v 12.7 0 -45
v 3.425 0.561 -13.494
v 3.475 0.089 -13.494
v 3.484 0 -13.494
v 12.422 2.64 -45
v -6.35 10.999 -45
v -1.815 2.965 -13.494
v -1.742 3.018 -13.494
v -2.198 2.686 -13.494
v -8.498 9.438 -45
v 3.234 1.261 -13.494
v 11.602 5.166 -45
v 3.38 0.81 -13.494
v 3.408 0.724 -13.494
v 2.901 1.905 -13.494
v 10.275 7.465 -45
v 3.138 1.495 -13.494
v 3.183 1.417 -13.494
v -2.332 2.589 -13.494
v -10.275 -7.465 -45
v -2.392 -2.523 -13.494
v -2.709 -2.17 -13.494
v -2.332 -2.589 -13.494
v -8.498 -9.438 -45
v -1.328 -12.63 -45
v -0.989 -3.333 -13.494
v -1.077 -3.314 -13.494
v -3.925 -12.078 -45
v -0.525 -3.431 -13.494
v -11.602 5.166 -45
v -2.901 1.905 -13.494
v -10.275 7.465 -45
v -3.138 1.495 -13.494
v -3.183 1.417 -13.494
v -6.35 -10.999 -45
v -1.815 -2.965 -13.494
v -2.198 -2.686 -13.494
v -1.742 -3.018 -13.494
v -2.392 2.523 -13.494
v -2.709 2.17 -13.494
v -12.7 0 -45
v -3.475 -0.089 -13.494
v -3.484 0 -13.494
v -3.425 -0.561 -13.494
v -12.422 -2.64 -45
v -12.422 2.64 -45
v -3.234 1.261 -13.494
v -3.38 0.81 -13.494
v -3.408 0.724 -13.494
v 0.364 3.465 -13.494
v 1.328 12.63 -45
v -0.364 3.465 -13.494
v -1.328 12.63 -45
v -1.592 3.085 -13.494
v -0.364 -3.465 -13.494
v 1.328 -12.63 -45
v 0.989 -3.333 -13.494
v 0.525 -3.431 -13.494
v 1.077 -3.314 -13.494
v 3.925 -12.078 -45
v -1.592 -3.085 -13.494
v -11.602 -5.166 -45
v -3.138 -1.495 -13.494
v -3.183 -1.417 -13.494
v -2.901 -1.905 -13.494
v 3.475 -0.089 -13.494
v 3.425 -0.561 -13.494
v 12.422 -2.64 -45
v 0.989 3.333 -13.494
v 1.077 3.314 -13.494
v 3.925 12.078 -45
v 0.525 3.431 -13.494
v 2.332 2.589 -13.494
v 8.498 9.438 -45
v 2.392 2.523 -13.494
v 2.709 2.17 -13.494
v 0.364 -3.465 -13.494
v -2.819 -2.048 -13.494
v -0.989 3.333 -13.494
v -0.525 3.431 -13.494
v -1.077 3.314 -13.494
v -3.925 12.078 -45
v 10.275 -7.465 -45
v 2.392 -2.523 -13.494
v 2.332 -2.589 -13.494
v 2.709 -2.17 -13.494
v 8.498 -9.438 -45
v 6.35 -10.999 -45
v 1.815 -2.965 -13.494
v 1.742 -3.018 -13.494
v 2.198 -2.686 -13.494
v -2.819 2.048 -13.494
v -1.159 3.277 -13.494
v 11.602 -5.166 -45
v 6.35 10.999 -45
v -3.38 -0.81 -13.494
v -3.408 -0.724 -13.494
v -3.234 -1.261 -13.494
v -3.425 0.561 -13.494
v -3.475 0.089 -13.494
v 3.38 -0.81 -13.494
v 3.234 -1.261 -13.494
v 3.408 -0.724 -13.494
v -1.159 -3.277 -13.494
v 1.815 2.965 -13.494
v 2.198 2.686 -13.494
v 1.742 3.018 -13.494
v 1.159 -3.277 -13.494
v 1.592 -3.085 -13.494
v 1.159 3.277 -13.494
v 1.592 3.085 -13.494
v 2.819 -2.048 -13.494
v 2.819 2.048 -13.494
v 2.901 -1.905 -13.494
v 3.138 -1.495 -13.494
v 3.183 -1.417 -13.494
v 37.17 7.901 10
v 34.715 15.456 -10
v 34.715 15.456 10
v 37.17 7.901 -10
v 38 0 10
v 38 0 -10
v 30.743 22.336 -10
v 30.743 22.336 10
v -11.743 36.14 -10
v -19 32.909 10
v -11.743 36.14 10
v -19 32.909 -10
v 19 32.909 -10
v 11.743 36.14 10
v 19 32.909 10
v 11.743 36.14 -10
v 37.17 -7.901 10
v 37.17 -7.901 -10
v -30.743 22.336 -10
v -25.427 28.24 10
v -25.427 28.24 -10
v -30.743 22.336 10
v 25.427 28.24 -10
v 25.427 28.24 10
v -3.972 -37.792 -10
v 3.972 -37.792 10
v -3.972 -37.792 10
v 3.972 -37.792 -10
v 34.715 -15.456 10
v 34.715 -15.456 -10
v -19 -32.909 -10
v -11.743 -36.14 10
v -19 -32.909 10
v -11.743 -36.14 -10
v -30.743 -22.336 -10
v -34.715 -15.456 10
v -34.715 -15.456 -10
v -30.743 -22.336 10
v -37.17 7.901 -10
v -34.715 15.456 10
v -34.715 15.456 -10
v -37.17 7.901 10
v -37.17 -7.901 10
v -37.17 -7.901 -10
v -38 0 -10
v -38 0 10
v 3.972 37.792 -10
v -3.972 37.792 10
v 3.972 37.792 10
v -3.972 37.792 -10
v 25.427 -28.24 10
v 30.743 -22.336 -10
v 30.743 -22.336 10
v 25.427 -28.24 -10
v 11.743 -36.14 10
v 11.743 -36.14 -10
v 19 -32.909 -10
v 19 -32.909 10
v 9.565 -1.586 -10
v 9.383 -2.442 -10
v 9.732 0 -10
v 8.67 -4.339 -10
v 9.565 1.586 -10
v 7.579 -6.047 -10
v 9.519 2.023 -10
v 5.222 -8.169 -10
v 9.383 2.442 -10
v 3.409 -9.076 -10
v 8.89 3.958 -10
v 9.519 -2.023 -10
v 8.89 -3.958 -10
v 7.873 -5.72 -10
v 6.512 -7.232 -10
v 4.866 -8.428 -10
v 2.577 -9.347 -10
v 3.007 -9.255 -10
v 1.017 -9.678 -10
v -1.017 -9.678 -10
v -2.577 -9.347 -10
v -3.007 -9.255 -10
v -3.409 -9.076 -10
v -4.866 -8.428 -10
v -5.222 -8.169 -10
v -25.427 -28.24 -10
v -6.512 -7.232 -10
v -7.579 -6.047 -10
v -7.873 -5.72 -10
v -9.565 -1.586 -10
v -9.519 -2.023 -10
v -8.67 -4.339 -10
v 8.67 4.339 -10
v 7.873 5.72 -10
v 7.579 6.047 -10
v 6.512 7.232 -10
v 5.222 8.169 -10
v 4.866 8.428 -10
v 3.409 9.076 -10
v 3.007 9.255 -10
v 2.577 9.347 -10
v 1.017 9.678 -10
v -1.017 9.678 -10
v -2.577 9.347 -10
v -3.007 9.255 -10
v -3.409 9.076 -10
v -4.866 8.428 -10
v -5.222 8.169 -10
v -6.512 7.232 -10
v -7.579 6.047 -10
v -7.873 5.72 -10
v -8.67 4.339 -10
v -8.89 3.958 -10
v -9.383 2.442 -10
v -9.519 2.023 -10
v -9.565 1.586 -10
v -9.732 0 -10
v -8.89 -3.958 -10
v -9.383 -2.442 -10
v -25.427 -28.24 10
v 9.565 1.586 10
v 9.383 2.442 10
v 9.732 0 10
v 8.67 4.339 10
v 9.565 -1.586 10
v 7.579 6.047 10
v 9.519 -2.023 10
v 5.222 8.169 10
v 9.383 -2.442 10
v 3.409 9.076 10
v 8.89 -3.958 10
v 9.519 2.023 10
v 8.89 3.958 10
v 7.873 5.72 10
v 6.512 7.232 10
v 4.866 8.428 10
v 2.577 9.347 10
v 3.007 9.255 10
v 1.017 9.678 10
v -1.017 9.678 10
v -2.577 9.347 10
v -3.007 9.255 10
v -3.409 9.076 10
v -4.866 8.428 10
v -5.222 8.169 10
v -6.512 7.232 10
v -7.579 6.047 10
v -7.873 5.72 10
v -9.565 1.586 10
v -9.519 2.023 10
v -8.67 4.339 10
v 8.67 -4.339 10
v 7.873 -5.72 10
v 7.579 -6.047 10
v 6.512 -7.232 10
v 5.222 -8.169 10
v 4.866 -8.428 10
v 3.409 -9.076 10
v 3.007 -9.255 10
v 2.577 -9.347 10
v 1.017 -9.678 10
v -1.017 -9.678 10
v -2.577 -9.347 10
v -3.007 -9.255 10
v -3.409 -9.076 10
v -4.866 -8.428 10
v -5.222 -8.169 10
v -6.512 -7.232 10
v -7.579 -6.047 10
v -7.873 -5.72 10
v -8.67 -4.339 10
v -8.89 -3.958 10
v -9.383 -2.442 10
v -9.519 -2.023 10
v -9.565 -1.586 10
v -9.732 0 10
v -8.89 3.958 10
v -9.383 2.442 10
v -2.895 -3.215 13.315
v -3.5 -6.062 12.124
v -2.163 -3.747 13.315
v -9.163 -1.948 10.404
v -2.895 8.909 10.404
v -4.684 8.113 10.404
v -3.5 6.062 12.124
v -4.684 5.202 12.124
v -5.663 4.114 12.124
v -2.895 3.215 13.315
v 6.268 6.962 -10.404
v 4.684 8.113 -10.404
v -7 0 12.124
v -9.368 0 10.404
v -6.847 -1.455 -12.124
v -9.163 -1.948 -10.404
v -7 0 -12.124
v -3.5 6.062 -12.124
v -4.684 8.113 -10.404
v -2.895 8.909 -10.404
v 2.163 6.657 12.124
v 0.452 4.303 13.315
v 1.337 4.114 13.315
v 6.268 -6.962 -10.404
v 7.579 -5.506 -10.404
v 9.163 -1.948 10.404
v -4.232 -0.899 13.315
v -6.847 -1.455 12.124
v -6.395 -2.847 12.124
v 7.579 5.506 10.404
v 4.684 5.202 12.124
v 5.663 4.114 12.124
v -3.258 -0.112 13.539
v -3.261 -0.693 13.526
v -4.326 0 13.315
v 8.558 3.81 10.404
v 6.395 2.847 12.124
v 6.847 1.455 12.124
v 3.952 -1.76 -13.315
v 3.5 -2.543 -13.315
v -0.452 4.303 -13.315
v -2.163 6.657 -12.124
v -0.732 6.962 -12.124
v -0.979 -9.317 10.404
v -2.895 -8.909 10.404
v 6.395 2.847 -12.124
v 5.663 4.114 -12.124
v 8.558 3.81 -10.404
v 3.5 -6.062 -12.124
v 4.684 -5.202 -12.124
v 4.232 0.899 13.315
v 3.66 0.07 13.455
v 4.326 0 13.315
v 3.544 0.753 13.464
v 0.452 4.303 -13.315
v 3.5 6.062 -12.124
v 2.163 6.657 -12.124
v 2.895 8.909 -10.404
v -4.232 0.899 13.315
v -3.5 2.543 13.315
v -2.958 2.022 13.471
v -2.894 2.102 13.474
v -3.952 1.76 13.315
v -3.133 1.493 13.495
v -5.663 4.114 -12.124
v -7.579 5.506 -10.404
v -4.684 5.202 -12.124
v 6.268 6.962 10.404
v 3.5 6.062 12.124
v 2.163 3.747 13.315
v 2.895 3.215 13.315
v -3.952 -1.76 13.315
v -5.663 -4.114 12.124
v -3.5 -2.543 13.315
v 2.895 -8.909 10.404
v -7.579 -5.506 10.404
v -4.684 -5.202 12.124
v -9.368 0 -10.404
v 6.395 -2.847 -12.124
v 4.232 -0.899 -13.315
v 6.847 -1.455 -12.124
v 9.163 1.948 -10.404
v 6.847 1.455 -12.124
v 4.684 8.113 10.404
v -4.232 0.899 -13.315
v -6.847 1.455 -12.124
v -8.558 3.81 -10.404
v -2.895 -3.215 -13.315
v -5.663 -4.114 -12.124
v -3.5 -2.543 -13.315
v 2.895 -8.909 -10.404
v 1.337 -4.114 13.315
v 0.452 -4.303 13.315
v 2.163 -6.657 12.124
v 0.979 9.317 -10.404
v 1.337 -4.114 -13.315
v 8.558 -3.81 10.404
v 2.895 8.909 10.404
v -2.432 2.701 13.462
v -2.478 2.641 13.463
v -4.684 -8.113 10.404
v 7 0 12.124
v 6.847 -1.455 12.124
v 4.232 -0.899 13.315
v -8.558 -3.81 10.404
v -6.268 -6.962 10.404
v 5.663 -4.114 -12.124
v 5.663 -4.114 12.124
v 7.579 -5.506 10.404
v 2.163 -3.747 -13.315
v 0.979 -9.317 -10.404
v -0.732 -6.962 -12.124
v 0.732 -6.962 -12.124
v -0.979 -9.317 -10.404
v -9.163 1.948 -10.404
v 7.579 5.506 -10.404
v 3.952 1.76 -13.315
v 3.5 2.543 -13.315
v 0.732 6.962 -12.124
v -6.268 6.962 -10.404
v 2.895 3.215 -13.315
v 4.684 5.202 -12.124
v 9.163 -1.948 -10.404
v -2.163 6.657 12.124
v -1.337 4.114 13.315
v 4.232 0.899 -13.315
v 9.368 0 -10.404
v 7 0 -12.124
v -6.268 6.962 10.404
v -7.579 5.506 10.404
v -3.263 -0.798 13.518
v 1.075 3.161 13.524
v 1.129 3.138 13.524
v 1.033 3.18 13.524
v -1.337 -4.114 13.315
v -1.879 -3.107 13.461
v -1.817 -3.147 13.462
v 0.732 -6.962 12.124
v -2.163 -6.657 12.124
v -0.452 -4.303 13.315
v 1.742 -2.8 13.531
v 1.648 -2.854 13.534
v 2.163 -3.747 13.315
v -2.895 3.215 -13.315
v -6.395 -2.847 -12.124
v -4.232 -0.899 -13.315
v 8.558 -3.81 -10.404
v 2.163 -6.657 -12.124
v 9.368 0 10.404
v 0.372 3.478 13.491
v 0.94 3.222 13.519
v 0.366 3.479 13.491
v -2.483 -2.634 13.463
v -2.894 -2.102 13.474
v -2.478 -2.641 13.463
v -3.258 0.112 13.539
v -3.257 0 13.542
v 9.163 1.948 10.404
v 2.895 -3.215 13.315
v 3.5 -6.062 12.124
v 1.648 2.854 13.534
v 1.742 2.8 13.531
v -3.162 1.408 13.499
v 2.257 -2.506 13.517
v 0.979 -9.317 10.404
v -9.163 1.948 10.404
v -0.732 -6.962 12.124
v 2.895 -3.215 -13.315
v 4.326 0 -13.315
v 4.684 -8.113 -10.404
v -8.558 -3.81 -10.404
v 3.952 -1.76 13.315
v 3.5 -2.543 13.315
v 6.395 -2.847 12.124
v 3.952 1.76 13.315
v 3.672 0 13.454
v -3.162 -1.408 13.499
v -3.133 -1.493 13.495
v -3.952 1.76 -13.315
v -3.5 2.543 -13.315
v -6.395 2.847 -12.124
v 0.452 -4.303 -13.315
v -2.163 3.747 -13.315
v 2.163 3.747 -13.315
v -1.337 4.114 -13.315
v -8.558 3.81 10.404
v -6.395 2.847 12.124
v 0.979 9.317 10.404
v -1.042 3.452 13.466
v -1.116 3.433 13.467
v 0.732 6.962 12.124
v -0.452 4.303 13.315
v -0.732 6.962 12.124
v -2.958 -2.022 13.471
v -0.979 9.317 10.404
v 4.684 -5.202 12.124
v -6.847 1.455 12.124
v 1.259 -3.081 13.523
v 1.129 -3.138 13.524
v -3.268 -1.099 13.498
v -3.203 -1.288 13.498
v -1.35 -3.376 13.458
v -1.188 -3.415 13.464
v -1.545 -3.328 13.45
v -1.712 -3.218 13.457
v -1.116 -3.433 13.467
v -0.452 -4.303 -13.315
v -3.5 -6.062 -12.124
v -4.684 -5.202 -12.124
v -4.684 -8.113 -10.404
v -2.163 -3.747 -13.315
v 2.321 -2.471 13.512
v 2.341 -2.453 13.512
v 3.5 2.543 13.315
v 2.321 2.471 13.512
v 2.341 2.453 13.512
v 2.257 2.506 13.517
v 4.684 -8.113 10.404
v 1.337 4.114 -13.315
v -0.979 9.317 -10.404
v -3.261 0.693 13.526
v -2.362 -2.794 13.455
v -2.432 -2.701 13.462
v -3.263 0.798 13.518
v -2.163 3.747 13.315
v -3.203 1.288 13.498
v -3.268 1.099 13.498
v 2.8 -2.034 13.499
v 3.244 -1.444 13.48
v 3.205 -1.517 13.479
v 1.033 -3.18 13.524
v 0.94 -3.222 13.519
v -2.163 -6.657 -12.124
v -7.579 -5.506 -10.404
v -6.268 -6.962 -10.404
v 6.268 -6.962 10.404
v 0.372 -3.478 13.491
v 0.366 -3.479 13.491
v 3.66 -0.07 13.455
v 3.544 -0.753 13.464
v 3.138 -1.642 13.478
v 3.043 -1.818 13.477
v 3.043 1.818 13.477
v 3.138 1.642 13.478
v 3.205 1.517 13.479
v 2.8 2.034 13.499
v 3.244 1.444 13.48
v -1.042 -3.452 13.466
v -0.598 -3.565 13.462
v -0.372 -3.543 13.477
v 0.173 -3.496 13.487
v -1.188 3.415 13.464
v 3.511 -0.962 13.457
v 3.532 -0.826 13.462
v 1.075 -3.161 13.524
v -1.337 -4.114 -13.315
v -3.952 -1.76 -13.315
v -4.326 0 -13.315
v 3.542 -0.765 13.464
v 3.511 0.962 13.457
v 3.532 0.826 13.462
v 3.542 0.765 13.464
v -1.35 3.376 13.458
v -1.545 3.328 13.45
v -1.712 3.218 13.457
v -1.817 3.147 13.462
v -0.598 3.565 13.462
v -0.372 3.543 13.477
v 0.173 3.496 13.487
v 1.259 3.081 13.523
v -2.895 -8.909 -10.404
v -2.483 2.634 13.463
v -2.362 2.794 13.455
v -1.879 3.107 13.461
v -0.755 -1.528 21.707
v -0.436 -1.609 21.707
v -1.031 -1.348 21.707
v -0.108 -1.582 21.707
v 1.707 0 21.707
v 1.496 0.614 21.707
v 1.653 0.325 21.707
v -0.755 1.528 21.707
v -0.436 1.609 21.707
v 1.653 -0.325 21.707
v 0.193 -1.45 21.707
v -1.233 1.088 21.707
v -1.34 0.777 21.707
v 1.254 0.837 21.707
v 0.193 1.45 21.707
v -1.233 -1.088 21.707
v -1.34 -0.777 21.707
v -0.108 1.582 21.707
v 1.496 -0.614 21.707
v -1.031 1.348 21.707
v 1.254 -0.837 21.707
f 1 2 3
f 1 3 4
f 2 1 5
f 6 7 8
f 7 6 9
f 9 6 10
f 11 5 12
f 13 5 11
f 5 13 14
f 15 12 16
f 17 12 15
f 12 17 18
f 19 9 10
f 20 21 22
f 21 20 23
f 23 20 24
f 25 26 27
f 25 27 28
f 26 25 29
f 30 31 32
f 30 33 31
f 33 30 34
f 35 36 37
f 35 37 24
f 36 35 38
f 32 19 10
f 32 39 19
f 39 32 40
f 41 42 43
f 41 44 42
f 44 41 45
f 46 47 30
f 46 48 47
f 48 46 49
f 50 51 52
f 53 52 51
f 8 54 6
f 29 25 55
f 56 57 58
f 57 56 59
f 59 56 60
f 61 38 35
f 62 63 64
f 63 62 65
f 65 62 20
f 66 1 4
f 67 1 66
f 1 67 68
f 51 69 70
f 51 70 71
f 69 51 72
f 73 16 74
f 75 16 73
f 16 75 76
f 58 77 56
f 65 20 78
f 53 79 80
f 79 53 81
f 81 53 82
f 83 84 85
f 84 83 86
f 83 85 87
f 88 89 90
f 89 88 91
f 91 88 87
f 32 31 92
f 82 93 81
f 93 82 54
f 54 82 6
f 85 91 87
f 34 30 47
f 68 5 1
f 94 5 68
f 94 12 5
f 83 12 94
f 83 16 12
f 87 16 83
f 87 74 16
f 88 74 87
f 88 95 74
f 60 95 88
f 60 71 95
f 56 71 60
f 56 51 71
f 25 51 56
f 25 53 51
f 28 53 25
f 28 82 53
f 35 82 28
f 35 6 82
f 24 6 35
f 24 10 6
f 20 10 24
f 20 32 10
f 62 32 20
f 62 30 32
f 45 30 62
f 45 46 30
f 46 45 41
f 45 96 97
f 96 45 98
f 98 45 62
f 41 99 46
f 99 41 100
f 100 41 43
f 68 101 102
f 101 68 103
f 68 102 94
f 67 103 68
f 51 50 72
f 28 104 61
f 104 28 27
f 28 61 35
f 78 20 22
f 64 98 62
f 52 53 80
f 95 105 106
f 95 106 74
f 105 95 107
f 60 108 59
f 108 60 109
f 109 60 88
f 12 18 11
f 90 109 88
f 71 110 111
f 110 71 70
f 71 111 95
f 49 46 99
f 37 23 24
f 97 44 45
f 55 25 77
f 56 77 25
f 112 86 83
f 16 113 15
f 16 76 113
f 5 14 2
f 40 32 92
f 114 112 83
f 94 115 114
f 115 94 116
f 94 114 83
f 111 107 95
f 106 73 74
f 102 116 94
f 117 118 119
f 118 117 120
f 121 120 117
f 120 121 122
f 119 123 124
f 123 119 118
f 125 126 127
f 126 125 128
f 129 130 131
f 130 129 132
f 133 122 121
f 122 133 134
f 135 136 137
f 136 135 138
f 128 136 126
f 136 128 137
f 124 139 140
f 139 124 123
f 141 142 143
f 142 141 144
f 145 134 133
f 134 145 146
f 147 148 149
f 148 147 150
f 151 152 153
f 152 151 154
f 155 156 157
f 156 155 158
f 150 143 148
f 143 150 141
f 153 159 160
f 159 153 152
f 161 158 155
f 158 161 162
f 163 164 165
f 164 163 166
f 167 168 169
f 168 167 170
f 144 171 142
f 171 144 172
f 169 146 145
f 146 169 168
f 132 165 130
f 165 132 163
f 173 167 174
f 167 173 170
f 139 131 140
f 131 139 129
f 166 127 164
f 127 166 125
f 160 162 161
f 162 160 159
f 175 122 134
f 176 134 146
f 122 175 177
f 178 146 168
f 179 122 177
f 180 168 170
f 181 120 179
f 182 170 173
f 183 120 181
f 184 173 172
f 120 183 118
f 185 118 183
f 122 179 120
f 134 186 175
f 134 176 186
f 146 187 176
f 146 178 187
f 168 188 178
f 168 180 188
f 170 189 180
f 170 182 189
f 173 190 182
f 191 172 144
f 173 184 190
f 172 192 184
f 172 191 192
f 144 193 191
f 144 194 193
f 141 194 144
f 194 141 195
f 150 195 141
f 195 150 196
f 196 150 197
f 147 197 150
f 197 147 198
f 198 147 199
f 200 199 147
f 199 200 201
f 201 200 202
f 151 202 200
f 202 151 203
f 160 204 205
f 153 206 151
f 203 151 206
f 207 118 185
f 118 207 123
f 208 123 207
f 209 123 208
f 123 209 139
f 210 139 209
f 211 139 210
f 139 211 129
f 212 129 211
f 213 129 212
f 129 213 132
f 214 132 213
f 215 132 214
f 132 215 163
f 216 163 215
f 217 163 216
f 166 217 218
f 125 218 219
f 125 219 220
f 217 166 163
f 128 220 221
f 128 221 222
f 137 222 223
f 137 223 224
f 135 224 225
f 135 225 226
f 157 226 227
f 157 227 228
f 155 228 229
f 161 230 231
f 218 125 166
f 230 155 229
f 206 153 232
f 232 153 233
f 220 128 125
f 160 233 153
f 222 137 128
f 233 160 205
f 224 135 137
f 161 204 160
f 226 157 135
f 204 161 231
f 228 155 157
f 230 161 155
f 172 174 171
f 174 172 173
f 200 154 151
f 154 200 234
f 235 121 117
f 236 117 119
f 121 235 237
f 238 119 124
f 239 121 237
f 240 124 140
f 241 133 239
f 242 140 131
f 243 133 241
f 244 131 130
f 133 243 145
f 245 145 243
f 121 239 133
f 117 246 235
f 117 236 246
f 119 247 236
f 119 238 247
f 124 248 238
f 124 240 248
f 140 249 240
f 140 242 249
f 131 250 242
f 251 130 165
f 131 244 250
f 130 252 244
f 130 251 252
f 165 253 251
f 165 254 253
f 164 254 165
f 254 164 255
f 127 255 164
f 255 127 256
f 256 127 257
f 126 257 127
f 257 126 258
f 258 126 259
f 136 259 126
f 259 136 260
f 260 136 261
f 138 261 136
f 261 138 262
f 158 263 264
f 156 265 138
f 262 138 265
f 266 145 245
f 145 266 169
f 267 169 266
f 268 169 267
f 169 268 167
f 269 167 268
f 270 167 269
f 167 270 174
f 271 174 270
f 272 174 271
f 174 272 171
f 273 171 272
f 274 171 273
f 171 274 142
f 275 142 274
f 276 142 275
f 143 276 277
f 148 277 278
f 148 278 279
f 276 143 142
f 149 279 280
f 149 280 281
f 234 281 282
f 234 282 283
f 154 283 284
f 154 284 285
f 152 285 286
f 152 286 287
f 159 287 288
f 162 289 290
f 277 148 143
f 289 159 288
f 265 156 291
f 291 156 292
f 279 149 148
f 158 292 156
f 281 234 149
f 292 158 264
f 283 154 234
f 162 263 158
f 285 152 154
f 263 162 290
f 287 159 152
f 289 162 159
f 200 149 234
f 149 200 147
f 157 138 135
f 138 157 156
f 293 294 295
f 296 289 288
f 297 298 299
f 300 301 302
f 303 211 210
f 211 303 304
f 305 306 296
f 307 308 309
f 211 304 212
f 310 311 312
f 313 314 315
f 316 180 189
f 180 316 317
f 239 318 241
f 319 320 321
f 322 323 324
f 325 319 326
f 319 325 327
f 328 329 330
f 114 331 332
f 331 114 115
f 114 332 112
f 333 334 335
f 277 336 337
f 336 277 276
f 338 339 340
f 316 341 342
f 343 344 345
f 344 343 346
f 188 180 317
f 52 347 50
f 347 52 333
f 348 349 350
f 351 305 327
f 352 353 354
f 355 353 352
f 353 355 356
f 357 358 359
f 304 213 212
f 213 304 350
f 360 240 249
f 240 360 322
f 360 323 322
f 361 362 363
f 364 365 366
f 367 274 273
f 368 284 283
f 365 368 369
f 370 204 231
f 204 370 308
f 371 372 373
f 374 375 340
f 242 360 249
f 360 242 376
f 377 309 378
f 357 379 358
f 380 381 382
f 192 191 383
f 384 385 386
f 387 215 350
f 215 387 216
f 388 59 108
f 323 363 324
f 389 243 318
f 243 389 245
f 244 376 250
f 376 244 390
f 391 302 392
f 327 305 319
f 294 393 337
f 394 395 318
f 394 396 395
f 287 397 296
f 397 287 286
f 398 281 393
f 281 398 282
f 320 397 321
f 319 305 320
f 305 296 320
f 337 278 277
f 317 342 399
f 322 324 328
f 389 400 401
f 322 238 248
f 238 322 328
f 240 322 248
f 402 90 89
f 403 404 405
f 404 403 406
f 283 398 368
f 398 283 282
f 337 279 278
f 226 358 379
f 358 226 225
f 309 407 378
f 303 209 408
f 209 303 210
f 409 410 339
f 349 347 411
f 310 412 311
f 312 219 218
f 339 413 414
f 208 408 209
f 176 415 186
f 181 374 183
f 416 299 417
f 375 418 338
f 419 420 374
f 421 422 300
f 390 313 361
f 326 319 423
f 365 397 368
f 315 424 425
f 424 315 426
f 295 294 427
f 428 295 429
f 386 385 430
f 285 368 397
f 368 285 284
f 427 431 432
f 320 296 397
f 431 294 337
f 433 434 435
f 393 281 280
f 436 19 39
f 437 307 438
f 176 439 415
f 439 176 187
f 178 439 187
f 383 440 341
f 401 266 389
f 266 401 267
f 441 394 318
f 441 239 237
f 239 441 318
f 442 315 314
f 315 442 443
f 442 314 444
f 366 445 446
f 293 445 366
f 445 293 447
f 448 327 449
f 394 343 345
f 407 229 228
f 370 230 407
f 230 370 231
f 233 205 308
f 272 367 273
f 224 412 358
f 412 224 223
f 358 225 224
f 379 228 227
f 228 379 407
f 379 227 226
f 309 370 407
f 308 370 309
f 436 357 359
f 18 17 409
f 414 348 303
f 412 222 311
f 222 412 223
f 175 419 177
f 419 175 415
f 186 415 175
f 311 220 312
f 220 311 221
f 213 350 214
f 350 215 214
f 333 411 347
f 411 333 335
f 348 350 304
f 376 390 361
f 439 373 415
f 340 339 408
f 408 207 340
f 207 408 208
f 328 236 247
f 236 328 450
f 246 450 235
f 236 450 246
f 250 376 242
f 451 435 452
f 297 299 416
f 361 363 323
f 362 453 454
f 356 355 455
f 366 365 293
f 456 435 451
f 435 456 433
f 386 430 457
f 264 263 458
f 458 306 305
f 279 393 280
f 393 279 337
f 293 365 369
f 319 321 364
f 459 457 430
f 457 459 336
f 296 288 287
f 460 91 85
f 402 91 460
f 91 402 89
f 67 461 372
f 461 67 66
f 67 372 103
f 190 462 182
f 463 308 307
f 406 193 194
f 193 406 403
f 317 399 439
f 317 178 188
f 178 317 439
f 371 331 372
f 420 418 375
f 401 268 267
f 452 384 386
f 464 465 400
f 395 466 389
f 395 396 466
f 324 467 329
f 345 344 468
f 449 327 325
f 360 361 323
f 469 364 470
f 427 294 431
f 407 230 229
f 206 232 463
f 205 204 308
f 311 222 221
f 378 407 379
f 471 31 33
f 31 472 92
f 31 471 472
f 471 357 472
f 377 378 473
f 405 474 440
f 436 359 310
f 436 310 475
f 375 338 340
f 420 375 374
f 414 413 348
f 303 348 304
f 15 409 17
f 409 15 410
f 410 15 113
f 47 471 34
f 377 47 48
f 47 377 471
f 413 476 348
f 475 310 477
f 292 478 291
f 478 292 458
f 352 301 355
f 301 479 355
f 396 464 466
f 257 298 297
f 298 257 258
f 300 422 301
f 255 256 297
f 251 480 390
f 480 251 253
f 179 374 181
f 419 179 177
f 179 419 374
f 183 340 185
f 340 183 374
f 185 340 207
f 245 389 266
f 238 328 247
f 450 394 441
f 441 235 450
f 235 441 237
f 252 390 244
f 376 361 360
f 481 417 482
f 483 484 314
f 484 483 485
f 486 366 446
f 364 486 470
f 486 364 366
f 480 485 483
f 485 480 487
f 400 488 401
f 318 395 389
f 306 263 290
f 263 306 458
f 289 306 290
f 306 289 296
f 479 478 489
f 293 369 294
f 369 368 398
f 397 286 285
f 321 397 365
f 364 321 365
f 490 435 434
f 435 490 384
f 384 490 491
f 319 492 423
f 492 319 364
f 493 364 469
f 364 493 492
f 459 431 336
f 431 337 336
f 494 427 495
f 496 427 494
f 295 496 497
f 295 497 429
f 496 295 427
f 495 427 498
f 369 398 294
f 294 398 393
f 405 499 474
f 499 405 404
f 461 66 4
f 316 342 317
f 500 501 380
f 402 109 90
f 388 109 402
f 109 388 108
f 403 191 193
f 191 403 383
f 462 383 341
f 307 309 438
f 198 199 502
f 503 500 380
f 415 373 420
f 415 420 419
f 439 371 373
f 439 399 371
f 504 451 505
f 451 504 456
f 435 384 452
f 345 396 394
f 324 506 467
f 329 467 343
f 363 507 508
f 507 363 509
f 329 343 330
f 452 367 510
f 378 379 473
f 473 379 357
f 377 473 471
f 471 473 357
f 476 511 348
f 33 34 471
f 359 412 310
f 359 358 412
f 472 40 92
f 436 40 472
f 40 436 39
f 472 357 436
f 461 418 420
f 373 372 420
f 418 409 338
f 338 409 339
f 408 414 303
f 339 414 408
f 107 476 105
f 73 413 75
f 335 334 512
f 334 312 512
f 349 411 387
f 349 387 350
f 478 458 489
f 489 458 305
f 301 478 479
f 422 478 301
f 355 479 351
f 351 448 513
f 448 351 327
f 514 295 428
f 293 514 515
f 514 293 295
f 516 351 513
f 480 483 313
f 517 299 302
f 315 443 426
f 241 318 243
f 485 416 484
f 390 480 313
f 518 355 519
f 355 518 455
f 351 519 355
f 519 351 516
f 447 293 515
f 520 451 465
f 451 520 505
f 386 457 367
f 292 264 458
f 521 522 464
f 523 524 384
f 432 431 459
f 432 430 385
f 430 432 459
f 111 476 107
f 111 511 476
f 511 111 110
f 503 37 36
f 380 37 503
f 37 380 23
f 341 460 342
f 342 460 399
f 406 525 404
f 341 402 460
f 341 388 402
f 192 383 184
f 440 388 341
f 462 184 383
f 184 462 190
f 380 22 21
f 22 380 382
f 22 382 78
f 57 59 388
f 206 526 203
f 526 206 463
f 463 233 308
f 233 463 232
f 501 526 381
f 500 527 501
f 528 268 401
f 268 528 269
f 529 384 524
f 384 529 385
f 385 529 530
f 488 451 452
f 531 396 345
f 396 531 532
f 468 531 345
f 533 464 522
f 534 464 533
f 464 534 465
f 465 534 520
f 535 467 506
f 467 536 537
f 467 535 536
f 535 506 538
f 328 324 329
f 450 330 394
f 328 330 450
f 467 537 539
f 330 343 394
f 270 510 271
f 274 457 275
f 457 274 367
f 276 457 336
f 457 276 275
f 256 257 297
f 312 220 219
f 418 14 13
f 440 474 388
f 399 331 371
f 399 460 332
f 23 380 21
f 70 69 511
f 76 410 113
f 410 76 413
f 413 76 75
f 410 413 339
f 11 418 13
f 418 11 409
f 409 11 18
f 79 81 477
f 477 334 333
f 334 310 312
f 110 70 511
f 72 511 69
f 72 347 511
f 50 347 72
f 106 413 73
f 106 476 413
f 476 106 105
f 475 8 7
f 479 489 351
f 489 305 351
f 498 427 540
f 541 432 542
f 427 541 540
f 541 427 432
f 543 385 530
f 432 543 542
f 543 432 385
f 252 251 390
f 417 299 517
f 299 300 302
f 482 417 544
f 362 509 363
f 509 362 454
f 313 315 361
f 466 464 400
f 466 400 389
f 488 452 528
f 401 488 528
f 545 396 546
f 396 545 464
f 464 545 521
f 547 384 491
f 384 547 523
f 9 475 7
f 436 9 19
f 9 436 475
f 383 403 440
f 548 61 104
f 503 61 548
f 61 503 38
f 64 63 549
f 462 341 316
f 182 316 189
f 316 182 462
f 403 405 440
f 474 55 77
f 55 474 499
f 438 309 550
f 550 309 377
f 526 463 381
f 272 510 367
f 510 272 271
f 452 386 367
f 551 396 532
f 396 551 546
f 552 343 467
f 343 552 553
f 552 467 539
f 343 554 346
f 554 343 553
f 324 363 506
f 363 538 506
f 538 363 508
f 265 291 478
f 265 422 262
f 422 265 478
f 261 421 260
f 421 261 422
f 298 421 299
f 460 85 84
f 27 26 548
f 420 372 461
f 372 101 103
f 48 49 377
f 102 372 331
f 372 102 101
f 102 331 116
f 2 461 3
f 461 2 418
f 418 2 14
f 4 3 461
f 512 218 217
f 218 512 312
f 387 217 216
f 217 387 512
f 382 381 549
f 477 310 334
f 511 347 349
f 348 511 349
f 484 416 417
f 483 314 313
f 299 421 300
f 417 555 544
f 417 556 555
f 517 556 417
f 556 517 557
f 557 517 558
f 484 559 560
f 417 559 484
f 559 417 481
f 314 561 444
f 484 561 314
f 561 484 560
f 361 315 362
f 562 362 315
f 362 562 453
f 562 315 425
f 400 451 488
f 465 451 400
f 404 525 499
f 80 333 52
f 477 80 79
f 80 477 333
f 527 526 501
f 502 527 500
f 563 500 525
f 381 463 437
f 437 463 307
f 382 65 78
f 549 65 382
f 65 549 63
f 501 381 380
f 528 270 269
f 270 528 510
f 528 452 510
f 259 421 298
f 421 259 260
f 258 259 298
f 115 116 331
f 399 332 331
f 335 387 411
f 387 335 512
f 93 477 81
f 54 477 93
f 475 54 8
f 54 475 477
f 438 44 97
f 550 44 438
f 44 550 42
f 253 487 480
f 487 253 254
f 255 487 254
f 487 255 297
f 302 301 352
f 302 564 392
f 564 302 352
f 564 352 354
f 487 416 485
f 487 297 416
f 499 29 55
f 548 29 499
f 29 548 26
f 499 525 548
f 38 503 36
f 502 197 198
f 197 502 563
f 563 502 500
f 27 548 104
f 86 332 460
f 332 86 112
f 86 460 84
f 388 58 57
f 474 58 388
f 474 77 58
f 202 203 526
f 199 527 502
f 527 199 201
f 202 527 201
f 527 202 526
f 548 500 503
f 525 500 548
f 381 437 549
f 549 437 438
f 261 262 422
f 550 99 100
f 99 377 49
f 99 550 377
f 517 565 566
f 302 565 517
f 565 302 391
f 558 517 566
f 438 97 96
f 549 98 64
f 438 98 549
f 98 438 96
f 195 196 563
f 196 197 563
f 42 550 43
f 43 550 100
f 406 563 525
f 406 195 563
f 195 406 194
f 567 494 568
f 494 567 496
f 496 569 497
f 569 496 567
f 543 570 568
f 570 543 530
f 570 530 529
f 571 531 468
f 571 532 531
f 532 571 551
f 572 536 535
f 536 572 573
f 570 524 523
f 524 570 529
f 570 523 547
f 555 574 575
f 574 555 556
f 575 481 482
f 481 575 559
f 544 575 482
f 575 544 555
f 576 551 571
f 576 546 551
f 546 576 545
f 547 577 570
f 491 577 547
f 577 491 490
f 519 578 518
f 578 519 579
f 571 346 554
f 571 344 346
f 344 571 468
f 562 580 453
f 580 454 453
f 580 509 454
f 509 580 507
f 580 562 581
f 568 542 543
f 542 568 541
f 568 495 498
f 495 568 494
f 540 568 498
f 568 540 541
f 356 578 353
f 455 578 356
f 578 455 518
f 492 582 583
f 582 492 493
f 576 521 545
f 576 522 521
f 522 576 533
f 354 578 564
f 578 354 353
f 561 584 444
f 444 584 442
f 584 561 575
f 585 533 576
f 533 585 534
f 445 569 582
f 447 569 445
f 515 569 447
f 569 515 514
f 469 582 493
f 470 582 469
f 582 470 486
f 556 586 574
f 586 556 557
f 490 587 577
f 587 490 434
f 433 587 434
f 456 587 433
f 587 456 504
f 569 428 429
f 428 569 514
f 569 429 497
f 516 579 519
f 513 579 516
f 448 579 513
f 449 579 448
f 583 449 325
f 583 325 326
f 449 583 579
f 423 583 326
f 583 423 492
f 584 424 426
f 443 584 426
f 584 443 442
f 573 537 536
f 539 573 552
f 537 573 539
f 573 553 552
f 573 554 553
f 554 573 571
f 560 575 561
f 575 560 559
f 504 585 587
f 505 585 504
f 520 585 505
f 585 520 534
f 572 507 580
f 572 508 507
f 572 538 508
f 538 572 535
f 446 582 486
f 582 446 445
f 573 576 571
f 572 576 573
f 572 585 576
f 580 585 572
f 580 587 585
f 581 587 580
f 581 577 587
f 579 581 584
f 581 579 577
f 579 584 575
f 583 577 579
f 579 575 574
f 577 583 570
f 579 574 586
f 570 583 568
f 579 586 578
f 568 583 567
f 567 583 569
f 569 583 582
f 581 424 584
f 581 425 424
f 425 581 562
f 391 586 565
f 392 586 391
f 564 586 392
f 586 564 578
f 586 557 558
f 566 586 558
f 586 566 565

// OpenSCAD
$f=9;
union()
{
	translate([0,0,-45 ]) cylinder( 40 , 12.7 );// handle
	
	cylinder( 20 , r= 38 , center=true); //disc
	sphere( 14 ); //middle sphere
	
	
	minkowski()
	{
		sphere( 1 , $fn=3 );
		cylinder( 21 , 6 ); //spinner
	}
}
